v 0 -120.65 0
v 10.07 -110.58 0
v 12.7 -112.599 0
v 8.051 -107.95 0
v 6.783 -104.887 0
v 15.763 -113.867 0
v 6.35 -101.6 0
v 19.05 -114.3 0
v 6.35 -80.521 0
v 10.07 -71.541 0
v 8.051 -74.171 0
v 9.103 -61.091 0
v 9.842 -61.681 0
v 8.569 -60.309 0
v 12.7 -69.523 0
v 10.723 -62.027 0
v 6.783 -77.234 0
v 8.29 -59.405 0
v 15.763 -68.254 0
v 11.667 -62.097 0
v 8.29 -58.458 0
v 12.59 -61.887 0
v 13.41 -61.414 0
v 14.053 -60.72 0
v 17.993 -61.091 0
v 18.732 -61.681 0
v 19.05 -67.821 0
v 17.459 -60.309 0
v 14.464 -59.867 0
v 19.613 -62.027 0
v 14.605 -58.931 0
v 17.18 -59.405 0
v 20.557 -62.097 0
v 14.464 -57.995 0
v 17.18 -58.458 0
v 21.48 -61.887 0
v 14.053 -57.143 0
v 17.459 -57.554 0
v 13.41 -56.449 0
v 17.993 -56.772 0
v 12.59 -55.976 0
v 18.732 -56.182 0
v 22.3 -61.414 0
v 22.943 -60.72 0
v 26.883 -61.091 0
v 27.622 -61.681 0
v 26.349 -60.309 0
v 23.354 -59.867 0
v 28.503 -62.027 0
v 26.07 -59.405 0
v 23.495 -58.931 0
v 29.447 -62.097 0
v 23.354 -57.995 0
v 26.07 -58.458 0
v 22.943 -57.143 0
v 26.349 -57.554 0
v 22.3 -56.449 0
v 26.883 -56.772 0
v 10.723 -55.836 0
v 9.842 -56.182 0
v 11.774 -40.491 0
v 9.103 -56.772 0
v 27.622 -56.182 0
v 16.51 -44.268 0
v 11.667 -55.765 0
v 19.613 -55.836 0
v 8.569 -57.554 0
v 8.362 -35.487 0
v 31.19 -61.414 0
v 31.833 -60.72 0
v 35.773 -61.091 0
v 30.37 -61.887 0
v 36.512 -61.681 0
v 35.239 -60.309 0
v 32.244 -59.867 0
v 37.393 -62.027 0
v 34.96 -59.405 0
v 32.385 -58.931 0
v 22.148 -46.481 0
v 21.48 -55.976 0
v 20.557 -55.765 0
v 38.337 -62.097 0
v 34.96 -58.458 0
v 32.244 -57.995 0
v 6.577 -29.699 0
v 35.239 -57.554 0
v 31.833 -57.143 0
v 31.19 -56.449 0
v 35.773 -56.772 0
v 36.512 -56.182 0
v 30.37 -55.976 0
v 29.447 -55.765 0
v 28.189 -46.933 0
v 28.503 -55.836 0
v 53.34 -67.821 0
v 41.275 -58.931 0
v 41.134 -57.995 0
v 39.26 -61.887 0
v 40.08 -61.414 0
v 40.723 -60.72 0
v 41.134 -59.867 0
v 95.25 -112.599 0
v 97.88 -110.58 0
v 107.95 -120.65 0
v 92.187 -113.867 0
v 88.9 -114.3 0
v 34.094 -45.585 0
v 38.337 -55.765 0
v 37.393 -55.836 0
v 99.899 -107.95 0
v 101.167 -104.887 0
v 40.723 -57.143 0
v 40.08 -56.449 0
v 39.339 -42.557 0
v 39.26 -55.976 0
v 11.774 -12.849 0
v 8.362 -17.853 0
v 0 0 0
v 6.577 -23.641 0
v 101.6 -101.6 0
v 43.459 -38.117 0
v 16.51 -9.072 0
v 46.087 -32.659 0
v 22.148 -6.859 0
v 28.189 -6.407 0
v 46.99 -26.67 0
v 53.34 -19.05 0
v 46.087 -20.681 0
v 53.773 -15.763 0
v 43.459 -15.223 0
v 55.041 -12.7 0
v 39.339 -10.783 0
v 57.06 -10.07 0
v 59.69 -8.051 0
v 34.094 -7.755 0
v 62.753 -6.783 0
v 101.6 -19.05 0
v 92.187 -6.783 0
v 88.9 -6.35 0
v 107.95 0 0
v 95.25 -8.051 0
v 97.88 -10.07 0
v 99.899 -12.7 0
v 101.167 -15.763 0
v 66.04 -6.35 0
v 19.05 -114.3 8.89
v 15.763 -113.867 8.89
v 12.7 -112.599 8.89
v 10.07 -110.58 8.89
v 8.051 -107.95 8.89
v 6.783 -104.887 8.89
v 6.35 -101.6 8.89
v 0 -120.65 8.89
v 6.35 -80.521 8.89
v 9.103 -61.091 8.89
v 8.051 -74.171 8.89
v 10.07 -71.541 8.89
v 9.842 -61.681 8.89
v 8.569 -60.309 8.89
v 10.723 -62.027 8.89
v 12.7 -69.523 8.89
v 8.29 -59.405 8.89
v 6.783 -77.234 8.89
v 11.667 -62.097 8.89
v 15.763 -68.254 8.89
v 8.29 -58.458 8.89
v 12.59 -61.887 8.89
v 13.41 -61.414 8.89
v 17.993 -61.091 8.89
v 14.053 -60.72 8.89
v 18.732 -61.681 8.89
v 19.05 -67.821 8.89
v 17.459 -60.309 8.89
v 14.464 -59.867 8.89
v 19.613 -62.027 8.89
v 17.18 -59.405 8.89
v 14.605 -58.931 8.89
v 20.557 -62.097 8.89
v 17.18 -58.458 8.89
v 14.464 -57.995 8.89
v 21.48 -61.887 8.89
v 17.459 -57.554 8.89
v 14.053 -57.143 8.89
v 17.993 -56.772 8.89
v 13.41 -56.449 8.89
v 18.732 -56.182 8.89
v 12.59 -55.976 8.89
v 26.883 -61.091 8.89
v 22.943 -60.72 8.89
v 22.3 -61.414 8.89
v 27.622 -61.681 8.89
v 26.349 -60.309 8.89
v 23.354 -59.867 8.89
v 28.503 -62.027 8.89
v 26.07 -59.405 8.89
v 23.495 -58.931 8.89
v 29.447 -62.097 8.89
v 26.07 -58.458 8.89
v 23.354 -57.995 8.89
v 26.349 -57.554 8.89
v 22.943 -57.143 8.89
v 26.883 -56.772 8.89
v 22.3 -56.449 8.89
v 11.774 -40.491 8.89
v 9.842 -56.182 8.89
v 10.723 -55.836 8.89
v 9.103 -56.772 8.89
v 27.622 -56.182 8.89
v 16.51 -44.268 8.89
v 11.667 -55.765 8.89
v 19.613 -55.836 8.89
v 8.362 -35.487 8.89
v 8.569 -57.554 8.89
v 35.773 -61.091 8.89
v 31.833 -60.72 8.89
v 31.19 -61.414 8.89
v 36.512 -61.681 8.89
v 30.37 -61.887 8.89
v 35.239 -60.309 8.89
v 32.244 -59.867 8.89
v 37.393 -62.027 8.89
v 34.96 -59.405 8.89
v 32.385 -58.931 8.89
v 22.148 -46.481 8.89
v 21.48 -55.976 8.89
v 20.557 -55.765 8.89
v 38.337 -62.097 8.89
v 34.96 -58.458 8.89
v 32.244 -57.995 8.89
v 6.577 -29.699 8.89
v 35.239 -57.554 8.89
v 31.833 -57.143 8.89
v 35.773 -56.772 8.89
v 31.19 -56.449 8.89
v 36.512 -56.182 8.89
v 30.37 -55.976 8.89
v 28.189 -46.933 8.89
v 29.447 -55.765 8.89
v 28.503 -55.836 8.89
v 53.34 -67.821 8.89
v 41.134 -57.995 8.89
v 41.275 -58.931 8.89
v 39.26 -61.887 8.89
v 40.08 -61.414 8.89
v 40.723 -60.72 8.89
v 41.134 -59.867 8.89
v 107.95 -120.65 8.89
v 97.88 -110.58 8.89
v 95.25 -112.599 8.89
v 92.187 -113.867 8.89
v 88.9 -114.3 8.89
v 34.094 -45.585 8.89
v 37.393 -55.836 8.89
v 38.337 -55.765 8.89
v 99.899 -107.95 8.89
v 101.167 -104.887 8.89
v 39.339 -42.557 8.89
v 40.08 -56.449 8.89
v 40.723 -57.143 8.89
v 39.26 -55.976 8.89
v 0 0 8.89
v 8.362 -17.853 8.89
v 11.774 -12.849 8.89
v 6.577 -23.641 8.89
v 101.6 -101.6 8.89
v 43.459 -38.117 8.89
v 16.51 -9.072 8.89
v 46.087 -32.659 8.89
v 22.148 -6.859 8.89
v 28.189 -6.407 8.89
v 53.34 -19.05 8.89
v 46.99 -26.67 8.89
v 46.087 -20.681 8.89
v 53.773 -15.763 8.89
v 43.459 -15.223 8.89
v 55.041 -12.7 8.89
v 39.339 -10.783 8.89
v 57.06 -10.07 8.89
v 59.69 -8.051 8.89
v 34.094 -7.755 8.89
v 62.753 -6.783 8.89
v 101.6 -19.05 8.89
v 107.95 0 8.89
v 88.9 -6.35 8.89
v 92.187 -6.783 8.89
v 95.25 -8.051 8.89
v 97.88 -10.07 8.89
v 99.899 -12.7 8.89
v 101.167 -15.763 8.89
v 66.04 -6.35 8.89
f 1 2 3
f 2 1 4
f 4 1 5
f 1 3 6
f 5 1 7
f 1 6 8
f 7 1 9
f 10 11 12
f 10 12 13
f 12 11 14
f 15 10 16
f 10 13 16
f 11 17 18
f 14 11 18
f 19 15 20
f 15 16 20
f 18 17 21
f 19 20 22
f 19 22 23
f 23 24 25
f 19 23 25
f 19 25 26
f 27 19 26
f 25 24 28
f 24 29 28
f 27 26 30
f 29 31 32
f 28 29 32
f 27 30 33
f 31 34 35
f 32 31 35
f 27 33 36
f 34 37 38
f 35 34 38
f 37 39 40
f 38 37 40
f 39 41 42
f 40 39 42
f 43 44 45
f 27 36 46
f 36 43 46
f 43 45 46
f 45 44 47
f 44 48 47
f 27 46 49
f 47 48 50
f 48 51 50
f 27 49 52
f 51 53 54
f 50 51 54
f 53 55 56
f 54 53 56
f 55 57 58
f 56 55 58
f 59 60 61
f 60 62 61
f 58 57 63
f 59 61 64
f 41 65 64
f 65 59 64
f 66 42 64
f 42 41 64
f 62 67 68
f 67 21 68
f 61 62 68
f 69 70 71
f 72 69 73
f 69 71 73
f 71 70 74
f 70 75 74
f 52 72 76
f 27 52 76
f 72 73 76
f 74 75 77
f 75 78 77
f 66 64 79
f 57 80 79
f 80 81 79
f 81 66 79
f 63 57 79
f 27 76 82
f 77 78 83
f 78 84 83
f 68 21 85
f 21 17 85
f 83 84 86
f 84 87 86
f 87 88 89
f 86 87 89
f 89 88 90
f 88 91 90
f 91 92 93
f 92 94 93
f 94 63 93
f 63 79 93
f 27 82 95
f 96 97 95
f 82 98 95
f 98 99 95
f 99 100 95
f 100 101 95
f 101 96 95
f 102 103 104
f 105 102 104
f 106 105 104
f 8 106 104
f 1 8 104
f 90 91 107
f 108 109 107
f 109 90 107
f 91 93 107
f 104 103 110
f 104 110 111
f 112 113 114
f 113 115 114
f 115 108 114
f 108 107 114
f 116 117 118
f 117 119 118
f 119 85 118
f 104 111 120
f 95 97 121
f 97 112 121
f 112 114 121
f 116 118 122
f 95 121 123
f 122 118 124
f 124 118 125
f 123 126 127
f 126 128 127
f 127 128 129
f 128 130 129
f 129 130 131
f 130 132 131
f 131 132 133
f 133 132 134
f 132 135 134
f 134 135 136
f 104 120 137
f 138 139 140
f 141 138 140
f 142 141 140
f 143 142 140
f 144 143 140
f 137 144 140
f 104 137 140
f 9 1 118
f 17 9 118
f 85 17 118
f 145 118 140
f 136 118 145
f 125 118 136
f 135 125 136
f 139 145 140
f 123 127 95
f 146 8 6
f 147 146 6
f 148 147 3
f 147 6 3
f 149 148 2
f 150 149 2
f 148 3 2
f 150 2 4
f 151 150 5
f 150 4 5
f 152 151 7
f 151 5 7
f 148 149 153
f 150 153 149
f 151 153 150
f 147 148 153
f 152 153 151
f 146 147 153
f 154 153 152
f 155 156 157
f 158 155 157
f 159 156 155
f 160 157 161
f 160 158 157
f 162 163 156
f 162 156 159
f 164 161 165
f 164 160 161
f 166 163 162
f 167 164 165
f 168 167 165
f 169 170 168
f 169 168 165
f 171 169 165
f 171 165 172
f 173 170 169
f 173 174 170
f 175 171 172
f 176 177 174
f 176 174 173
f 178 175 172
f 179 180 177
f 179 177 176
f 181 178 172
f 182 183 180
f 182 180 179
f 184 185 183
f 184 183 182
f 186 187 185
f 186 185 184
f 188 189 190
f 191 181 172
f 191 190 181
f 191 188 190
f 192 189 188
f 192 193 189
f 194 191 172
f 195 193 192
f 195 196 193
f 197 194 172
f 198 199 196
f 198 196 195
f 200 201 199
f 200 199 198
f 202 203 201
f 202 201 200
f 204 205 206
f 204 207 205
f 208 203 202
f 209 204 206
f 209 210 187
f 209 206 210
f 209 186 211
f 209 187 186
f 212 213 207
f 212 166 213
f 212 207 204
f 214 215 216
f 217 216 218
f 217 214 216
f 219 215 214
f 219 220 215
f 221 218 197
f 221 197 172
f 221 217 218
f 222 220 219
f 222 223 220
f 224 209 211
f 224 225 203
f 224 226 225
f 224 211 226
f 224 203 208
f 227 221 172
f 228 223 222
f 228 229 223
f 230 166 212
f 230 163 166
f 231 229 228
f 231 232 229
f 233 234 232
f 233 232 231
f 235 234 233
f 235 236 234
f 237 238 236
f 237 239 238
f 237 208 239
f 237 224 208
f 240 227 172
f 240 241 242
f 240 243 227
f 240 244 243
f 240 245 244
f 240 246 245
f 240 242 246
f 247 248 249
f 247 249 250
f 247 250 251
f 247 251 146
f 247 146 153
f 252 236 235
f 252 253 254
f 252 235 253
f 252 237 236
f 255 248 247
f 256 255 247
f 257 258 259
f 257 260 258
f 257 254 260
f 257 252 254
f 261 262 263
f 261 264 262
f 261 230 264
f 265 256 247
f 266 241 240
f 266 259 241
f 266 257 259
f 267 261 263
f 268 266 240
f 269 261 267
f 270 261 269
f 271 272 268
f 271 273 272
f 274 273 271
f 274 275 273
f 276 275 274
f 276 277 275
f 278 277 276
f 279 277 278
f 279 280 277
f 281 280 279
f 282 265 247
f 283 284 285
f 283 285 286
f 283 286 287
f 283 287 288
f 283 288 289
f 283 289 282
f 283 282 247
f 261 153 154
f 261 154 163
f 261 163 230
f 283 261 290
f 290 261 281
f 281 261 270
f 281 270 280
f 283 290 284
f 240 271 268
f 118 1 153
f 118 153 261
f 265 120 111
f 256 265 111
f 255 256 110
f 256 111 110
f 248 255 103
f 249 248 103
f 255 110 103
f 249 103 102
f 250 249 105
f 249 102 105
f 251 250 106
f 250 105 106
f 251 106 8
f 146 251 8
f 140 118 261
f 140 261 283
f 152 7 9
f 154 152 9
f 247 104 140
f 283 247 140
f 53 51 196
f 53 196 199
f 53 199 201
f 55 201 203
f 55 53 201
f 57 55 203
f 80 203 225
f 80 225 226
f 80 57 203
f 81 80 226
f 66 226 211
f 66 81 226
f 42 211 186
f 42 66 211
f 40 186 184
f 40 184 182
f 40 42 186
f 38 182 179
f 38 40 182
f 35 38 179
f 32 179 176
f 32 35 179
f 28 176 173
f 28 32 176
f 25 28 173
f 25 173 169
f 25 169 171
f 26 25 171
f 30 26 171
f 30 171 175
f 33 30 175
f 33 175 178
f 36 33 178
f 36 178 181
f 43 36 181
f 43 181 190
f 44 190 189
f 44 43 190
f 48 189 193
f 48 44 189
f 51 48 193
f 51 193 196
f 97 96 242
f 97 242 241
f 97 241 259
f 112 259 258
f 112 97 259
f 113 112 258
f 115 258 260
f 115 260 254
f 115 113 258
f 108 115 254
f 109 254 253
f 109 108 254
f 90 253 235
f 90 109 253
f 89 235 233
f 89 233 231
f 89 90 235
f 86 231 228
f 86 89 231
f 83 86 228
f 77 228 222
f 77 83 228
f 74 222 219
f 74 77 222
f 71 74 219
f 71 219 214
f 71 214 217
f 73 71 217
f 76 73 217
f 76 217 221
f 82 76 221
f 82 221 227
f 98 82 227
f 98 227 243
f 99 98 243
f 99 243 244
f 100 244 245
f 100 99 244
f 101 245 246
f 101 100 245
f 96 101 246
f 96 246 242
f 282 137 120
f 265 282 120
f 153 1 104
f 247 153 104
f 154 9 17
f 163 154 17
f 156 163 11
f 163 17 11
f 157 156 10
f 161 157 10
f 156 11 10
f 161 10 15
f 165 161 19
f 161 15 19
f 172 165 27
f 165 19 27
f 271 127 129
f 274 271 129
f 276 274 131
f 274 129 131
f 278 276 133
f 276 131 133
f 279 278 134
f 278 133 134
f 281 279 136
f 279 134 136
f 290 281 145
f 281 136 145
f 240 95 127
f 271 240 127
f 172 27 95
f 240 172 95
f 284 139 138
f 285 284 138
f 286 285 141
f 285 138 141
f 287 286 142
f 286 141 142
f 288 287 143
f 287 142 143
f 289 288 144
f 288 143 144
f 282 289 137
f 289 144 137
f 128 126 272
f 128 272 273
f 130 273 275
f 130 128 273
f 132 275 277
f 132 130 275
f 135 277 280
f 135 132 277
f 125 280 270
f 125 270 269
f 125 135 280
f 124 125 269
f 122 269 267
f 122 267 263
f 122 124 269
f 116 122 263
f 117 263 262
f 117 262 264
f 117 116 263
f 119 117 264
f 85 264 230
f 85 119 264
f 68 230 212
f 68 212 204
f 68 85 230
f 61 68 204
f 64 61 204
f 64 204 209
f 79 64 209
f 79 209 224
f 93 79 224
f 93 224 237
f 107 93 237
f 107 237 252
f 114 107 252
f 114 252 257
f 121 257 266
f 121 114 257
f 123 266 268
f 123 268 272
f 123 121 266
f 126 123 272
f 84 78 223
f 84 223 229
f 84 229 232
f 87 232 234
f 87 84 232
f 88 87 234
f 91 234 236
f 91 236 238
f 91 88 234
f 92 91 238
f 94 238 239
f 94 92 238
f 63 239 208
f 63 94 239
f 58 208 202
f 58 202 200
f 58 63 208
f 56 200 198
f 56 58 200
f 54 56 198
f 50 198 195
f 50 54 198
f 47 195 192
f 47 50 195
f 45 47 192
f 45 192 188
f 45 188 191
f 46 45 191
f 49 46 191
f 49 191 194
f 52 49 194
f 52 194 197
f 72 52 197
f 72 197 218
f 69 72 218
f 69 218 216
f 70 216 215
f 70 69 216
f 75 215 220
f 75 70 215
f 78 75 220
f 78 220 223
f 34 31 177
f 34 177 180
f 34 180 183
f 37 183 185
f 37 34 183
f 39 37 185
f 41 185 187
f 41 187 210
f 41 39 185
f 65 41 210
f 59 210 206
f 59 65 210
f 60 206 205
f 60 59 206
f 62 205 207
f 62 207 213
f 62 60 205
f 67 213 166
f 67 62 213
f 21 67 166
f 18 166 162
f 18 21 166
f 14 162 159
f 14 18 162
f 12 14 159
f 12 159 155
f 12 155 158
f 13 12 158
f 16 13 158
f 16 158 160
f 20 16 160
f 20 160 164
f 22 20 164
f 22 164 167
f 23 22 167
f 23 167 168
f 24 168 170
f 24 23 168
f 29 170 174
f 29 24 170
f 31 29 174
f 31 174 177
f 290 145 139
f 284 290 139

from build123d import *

# Parameters (mm, degrees)
F0_W     = 107.95
F0_H     = 120.65
F0_R     = 3.175
F0_R_2   = 20.32
F1_DEPTH = 8.89


with BuildPart() as f1:
    # F0 (on Top) → F1 (new body)
    with BuildSketch(Plane.XY):
        with Locations((53.975, -60.325)):
            Rectangle(F0_W, F0_H)
        with Locations((11.43, -58.931326)):
            Circle(F0_R, mode=Mode.SUBTRACT)
        with Locations((20.32, -58.931326)):
            Circle(F0_R, mode=Mode.SUBTRACT)
        with Locations((29.21, -58.931326)):
            Circle(F0_R, mode=Mode.SUBTRACT)
        with Locations((38.1, -58.931326)):
            Circle(F0_R, mode=Mode.SUBTRACT)
        with BuildLine():
            ThreePointArc((53.34, -19.05), (57.059744, -10.069744), (66.04, -6.35))
            Line((66.04, -6.35), (88.9, -6.35))
            ThreePointArc((88.9, -6.35), (97.880256, -10.069744), (101.6, -19.05))
            Line((101.6, -19.05), (101.6, -101.6))
            ThreePointArc((101.6, -101.6), (97.880256, -110.580256), (88.9, -114.3))
            Line((88.9, -114.3), (53.34, -114.3))
            Line((53.34, -114.3), (52.828665, -114.3))
            Line((52.828665, -114.3), (19.05, -114.3))
            ThreePointArc((19.05, -114.3), (10.069744, -110.580256), (6.35, -101.6))
            Line((6.35, -101.6), (6.35, -80.521326))
            ThreePointArc((6.35, -80.521326), (10.069744, -71.54107), (19.05, -67.821326))
            Line((19.05, -67.821326), (53.34, -67.821326))
            Line((53.34, -67.821326), (53.34, -19.05))
        make_face(mode=Mode.SUBTRACT)
        with Locations((26.67, -26.67)):
            Circle(F0_R_2, mode=Mode.SUBTRACT)
    extrude(amount=F1_DEPTH)


solid = f1.part
